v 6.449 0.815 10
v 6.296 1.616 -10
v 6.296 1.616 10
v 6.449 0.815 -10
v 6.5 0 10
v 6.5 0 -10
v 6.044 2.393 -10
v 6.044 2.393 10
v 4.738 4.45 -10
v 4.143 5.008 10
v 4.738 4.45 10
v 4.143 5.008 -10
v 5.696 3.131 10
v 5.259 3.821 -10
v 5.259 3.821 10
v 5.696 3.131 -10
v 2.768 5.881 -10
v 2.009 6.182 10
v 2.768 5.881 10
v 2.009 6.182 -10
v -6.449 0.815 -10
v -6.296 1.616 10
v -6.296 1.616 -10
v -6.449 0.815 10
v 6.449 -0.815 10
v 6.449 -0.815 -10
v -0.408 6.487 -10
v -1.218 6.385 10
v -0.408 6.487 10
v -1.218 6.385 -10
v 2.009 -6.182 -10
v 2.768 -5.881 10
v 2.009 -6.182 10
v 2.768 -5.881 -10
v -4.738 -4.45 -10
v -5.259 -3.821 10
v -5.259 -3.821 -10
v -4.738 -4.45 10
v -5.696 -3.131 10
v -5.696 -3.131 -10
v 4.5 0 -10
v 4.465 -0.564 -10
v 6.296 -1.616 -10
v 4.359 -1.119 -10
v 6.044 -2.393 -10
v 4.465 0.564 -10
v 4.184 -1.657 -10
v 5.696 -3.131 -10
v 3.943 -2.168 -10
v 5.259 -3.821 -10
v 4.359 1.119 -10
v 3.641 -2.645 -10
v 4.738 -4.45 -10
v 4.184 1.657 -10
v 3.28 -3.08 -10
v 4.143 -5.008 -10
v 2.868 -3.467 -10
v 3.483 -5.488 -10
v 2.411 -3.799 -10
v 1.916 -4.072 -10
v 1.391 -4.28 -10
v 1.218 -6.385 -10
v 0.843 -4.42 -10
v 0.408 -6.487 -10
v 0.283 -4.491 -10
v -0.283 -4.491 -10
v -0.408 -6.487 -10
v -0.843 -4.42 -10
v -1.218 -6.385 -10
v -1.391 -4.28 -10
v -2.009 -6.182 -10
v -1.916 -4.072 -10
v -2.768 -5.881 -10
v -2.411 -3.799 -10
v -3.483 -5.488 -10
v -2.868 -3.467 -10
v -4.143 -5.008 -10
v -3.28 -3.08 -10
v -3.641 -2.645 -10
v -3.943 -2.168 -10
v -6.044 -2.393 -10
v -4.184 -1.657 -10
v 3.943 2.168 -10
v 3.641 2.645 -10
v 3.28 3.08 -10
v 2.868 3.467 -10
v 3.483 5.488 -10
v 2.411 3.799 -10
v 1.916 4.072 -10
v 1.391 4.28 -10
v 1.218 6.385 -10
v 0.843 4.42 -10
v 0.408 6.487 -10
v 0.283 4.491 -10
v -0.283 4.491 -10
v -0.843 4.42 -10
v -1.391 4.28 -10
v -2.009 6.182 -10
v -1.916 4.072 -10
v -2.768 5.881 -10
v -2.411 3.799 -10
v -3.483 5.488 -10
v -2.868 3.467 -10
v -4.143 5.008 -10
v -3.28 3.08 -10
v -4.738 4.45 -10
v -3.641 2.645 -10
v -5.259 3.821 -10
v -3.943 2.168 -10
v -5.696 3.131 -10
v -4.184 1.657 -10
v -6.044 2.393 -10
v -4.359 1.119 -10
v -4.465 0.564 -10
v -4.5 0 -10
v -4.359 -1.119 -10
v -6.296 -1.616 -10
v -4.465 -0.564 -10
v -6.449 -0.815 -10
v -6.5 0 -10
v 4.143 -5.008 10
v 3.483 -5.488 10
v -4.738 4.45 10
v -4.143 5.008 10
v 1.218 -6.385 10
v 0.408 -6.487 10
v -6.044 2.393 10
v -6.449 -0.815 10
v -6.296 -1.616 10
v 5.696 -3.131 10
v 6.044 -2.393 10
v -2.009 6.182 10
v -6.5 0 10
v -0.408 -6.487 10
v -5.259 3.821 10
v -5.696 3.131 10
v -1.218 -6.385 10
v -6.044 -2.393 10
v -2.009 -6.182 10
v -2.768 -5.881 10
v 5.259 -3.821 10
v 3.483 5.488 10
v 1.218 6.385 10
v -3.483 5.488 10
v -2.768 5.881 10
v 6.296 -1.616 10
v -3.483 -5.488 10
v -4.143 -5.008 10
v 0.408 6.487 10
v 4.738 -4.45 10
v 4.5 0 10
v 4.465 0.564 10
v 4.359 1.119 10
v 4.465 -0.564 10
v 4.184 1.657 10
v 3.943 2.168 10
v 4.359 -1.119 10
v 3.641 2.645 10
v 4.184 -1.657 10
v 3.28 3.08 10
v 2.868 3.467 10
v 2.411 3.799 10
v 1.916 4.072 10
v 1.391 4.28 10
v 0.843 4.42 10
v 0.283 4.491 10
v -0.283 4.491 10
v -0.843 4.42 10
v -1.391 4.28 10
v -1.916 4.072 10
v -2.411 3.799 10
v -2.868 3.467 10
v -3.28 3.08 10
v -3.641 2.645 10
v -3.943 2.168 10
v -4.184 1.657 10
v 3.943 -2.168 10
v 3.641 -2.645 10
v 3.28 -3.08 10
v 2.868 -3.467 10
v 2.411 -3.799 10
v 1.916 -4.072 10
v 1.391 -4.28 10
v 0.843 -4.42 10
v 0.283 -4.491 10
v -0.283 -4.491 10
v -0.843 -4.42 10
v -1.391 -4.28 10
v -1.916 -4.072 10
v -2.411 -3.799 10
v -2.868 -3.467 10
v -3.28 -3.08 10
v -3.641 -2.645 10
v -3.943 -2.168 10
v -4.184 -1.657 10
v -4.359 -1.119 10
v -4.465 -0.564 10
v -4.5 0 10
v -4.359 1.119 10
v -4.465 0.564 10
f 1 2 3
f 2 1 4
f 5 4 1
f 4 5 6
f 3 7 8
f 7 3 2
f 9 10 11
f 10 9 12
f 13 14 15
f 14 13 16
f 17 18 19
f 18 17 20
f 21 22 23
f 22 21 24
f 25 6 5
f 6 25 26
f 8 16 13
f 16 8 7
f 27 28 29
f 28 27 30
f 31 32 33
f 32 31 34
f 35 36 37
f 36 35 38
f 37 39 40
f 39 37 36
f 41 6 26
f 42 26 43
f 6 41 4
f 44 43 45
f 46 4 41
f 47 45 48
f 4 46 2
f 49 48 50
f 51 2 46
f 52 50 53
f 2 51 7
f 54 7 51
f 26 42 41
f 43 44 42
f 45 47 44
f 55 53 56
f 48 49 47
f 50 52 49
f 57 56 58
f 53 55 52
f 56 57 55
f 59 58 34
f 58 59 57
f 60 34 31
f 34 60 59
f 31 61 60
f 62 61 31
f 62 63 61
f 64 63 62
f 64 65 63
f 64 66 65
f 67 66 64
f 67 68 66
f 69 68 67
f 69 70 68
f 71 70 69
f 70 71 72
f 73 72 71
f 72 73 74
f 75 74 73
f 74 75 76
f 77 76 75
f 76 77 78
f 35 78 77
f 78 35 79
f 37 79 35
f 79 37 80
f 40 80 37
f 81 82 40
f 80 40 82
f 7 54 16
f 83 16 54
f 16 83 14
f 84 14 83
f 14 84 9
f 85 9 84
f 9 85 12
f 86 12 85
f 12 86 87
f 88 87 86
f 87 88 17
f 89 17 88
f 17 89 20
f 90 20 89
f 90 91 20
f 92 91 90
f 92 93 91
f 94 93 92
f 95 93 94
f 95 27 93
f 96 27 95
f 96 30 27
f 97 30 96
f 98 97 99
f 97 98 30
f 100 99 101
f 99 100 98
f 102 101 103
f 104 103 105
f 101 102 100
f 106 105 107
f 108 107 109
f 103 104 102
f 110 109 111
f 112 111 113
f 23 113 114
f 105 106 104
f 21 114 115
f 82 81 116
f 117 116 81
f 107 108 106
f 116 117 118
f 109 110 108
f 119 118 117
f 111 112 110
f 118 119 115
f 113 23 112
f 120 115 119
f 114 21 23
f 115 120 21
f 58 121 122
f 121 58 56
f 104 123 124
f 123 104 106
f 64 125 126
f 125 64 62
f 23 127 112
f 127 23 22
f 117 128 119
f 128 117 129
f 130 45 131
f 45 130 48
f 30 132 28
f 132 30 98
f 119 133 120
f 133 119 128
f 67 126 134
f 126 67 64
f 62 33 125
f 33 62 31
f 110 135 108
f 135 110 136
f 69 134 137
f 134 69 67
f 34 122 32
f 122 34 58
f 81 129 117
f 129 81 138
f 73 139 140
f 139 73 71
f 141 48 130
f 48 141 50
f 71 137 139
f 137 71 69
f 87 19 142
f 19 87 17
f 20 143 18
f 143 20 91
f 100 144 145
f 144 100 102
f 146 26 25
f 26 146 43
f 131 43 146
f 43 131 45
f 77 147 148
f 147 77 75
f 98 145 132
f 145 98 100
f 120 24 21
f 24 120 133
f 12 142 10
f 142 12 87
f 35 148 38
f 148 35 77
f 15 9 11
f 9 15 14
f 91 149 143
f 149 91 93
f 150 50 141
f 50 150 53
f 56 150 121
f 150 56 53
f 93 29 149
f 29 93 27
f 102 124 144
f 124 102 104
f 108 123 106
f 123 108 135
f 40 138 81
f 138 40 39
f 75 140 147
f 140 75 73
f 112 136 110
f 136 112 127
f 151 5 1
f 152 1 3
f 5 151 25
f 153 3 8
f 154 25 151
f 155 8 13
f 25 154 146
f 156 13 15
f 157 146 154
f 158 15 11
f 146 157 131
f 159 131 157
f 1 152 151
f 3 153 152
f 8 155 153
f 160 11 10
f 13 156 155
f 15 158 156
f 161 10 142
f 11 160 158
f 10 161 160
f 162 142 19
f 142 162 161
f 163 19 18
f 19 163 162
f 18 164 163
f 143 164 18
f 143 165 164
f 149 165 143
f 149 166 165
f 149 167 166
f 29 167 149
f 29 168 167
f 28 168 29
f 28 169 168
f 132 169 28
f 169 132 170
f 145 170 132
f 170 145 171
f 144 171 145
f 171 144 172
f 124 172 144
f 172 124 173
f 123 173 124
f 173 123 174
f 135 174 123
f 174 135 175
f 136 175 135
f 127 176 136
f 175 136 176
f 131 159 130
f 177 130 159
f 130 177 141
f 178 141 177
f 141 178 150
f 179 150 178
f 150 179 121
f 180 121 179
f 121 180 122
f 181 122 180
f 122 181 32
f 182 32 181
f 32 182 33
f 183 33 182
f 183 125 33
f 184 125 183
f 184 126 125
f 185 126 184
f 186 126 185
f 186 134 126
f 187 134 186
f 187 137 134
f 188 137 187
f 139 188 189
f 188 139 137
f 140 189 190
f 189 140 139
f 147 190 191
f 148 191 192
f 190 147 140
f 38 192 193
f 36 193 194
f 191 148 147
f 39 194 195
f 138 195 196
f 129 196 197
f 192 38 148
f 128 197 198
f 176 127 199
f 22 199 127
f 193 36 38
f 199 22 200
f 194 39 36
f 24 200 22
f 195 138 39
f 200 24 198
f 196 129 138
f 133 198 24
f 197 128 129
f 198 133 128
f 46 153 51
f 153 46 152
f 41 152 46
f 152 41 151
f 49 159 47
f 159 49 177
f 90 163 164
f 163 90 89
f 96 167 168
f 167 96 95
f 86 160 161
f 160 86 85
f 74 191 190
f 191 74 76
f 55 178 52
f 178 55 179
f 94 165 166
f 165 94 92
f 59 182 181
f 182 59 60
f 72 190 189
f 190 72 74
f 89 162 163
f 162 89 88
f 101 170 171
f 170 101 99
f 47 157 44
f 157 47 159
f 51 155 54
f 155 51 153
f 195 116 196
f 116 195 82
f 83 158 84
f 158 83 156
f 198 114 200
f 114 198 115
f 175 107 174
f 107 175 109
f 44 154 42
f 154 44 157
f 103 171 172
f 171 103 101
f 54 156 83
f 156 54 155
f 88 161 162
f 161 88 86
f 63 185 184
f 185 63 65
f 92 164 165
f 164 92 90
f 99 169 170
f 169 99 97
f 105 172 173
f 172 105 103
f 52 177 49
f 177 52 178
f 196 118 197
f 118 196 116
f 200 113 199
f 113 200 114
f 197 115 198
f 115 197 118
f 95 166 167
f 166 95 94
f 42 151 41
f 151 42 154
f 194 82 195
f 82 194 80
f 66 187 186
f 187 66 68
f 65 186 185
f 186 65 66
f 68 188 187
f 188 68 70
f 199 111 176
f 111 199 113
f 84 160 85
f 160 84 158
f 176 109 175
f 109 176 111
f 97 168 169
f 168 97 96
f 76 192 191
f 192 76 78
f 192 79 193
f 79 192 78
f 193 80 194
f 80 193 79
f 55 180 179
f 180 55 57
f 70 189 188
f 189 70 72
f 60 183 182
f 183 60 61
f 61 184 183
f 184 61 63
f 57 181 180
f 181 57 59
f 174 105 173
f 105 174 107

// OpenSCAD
$fn = 50;


difference() {
	union() {
		translate(v = [0, 0, -10.0000000000]) {
			cylinder(h = 20, r = 6.5000000000);
		}
	}
	union() {
		translate(v = [0, 0, -100.0000000000]) {
			cylinder(h = 200, r = 4.5000000000);
		}
	}
}
